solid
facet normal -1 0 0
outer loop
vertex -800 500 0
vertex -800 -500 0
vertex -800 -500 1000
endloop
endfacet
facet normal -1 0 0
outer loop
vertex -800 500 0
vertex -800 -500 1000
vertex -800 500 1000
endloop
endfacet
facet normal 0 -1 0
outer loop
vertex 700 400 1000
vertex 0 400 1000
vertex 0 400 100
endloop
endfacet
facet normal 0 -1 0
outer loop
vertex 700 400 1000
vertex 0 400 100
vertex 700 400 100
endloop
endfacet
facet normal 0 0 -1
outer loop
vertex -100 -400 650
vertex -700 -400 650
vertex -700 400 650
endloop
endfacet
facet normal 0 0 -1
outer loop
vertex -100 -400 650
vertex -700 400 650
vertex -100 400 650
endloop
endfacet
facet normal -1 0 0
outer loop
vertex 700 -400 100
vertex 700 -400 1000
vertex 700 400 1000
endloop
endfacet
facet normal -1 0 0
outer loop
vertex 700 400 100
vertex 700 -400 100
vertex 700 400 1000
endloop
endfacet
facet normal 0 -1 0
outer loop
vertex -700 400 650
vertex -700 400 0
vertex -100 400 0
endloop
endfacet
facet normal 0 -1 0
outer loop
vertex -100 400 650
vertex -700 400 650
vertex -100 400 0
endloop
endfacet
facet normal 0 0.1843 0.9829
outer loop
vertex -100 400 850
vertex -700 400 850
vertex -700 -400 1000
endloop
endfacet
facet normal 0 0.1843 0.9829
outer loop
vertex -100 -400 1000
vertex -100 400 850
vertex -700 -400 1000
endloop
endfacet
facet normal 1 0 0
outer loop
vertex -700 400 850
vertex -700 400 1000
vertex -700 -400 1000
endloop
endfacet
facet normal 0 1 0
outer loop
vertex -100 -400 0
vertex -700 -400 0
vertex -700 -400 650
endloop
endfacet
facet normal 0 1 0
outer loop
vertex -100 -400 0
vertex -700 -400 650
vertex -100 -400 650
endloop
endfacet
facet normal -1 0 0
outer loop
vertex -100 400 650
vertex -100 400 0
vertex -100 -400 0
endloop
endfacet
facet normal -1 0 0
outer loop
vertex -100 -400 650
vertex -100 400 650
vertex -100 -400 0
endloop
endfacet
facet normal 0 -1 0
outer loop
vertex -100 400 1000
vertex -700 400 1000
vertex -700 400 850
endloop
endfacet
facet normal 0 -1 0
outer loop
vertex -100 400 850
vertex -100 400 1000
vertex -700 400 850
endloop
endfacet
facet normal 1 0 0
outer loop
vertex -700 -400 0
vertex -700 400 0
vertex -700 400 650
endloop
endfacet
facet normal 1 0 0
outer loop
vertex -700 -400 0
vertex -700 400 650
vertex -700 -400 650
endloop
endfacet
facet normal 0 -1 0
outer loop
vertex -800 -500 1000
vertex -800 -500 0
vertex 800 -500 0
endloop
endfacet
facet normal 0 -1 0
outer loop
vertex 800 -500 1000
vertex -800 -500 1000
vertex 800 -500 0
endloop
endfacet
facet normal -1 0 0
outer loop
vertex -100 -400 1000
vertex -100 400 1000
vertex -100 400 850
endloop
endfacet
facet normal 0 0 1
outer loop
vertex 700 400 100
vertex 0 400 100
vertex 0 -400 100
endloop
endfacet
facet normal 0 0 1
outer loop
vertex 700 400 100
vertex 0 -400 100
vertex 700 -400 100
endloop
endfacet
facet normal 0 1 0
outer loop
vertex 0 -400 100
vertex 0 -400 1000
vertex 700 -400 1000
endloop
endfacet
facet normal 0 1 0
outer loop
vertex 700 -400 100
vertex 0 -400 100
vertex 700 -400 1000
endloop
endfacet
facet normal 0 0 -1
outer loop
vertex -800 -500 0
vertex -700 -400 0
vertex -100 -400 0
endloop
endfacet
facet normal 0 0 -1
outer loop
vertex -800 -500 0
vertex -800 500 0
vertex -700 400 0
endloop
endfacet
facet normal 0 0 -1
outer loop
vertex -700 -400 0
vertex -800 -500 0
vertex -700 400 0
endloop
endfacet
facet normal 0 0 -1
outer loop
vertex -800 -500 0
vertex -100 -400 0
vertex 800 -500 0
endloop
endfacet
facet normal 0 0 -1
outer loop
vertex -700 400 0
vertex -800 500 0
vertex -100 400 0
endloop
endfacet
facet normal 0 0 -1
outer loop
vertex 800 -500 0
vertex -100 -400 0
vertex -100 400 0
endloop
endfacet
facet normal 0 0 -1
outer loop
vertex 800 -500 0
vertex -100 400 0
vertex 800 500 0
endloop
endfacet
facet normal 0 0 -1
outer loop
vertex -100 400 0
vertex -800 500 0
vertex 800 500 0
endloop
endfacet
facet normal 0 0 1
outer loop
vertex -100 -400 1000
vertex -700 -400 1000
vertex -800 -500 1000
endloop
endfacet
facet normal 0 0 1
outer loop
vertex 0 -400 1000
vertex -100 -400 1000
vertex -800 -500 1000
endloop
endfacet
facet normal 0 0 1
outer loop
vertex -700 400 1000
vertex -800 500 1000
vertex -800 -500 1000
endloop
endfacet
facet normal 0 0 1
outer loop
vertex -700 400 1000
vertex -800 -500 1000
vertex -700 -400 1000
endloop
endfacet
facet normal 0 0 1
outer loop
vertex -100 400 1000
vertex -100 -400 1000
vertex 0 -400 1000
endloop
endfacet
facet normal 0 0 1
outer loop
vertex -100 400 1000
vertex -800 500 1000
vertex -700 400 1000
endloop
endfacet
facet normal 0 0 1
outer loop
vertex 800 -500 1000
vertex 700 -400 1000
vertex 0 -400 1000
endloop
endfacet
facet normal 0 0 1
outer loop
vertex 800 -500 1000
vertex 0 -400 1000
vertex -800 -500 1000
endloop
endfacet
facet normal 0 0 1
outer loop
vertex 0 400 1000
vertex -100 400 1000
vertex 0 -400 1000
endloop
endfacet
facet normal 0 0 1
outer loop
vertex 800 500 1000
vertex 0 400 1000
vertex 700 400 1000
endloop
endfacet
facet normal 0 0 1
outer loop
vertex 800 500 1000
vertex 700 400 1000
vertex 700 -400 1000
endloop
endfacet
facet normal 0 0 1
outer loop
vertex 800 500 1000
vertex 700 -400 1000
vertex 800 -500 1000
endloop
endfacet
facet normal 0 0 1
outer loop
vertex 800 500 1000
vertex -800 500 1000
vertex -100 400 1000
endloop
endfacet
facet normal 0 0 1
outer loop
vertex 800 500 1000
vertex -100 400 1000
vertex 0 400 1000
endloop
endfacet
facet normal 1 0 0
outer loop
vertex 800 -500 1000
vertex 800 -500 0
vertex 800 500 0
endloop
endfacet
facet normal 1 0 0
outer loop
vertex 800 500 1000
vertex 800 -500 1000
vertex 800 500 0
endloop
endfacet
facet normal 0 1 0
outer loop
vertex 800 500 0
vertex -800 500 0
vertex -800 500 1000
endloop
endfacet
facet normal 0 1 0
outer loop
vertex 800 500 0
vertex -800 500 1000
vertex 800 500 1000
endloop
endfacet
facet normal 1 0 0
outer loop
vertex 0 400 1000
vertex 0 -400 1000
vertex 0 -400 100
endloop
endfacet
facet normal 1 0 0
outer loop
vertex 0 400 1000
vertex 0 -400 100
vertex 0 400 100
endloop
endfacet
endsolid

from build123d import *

# Parameters (mm, degrees)
F0_W     = 1600
F0_H     = 1000
F1_DEPTH = 1000
F2_W     = 700
F2_H     = 800
F3_DEPTH = 900
F7_DEPTH = 600
F8_W     = 600.0000000002
F8_H     = 800
F9_DEPTH = 650


with BuildPart() as f1:
    # F0 (on Top) → F1 (new body)
    with BuildSketch(Plane.XY):
        Rectangle(F0_W, F0_H)
    extrude(amount=F1_DEPTH)

    # F2 (on face) → F3 (cut)
    with BuildSketch(Plane.XY.offset(1000)):
        with Locations((350, 0)):
            Rectangle(F2_W, F2_H)
    extrude(amount=-F3_DEPTH, mode=Mode.SUBTRACT)

    # F5 (on offset) → F7 (cut, through all)
    with BuildSketch(Plane(origin=(-700, 0, 0), x_dir=(0, -1, 0), z_dir=(-1, 0, 0))):
        Polygon((-400, 850), (400, 1000), (-400, 1000), align=None)
    extrude(amount=-F7_DEPTH, mode=Mode.SUBTRACT)

    # F8 (on face) → F9 (cut)
    with BuildSketch(Plane(origin=(0, 0, 0), x_dir=(1, 0, 0), z_dir=(0, 0, -1))):
        with Locations((-399.9999999999, 0)):
            Rectangle(F8_W, F8_H)
    extrude(amount=-F9_DEPTH, mode=Mode.SUBTRACT)


solid = f1.part
